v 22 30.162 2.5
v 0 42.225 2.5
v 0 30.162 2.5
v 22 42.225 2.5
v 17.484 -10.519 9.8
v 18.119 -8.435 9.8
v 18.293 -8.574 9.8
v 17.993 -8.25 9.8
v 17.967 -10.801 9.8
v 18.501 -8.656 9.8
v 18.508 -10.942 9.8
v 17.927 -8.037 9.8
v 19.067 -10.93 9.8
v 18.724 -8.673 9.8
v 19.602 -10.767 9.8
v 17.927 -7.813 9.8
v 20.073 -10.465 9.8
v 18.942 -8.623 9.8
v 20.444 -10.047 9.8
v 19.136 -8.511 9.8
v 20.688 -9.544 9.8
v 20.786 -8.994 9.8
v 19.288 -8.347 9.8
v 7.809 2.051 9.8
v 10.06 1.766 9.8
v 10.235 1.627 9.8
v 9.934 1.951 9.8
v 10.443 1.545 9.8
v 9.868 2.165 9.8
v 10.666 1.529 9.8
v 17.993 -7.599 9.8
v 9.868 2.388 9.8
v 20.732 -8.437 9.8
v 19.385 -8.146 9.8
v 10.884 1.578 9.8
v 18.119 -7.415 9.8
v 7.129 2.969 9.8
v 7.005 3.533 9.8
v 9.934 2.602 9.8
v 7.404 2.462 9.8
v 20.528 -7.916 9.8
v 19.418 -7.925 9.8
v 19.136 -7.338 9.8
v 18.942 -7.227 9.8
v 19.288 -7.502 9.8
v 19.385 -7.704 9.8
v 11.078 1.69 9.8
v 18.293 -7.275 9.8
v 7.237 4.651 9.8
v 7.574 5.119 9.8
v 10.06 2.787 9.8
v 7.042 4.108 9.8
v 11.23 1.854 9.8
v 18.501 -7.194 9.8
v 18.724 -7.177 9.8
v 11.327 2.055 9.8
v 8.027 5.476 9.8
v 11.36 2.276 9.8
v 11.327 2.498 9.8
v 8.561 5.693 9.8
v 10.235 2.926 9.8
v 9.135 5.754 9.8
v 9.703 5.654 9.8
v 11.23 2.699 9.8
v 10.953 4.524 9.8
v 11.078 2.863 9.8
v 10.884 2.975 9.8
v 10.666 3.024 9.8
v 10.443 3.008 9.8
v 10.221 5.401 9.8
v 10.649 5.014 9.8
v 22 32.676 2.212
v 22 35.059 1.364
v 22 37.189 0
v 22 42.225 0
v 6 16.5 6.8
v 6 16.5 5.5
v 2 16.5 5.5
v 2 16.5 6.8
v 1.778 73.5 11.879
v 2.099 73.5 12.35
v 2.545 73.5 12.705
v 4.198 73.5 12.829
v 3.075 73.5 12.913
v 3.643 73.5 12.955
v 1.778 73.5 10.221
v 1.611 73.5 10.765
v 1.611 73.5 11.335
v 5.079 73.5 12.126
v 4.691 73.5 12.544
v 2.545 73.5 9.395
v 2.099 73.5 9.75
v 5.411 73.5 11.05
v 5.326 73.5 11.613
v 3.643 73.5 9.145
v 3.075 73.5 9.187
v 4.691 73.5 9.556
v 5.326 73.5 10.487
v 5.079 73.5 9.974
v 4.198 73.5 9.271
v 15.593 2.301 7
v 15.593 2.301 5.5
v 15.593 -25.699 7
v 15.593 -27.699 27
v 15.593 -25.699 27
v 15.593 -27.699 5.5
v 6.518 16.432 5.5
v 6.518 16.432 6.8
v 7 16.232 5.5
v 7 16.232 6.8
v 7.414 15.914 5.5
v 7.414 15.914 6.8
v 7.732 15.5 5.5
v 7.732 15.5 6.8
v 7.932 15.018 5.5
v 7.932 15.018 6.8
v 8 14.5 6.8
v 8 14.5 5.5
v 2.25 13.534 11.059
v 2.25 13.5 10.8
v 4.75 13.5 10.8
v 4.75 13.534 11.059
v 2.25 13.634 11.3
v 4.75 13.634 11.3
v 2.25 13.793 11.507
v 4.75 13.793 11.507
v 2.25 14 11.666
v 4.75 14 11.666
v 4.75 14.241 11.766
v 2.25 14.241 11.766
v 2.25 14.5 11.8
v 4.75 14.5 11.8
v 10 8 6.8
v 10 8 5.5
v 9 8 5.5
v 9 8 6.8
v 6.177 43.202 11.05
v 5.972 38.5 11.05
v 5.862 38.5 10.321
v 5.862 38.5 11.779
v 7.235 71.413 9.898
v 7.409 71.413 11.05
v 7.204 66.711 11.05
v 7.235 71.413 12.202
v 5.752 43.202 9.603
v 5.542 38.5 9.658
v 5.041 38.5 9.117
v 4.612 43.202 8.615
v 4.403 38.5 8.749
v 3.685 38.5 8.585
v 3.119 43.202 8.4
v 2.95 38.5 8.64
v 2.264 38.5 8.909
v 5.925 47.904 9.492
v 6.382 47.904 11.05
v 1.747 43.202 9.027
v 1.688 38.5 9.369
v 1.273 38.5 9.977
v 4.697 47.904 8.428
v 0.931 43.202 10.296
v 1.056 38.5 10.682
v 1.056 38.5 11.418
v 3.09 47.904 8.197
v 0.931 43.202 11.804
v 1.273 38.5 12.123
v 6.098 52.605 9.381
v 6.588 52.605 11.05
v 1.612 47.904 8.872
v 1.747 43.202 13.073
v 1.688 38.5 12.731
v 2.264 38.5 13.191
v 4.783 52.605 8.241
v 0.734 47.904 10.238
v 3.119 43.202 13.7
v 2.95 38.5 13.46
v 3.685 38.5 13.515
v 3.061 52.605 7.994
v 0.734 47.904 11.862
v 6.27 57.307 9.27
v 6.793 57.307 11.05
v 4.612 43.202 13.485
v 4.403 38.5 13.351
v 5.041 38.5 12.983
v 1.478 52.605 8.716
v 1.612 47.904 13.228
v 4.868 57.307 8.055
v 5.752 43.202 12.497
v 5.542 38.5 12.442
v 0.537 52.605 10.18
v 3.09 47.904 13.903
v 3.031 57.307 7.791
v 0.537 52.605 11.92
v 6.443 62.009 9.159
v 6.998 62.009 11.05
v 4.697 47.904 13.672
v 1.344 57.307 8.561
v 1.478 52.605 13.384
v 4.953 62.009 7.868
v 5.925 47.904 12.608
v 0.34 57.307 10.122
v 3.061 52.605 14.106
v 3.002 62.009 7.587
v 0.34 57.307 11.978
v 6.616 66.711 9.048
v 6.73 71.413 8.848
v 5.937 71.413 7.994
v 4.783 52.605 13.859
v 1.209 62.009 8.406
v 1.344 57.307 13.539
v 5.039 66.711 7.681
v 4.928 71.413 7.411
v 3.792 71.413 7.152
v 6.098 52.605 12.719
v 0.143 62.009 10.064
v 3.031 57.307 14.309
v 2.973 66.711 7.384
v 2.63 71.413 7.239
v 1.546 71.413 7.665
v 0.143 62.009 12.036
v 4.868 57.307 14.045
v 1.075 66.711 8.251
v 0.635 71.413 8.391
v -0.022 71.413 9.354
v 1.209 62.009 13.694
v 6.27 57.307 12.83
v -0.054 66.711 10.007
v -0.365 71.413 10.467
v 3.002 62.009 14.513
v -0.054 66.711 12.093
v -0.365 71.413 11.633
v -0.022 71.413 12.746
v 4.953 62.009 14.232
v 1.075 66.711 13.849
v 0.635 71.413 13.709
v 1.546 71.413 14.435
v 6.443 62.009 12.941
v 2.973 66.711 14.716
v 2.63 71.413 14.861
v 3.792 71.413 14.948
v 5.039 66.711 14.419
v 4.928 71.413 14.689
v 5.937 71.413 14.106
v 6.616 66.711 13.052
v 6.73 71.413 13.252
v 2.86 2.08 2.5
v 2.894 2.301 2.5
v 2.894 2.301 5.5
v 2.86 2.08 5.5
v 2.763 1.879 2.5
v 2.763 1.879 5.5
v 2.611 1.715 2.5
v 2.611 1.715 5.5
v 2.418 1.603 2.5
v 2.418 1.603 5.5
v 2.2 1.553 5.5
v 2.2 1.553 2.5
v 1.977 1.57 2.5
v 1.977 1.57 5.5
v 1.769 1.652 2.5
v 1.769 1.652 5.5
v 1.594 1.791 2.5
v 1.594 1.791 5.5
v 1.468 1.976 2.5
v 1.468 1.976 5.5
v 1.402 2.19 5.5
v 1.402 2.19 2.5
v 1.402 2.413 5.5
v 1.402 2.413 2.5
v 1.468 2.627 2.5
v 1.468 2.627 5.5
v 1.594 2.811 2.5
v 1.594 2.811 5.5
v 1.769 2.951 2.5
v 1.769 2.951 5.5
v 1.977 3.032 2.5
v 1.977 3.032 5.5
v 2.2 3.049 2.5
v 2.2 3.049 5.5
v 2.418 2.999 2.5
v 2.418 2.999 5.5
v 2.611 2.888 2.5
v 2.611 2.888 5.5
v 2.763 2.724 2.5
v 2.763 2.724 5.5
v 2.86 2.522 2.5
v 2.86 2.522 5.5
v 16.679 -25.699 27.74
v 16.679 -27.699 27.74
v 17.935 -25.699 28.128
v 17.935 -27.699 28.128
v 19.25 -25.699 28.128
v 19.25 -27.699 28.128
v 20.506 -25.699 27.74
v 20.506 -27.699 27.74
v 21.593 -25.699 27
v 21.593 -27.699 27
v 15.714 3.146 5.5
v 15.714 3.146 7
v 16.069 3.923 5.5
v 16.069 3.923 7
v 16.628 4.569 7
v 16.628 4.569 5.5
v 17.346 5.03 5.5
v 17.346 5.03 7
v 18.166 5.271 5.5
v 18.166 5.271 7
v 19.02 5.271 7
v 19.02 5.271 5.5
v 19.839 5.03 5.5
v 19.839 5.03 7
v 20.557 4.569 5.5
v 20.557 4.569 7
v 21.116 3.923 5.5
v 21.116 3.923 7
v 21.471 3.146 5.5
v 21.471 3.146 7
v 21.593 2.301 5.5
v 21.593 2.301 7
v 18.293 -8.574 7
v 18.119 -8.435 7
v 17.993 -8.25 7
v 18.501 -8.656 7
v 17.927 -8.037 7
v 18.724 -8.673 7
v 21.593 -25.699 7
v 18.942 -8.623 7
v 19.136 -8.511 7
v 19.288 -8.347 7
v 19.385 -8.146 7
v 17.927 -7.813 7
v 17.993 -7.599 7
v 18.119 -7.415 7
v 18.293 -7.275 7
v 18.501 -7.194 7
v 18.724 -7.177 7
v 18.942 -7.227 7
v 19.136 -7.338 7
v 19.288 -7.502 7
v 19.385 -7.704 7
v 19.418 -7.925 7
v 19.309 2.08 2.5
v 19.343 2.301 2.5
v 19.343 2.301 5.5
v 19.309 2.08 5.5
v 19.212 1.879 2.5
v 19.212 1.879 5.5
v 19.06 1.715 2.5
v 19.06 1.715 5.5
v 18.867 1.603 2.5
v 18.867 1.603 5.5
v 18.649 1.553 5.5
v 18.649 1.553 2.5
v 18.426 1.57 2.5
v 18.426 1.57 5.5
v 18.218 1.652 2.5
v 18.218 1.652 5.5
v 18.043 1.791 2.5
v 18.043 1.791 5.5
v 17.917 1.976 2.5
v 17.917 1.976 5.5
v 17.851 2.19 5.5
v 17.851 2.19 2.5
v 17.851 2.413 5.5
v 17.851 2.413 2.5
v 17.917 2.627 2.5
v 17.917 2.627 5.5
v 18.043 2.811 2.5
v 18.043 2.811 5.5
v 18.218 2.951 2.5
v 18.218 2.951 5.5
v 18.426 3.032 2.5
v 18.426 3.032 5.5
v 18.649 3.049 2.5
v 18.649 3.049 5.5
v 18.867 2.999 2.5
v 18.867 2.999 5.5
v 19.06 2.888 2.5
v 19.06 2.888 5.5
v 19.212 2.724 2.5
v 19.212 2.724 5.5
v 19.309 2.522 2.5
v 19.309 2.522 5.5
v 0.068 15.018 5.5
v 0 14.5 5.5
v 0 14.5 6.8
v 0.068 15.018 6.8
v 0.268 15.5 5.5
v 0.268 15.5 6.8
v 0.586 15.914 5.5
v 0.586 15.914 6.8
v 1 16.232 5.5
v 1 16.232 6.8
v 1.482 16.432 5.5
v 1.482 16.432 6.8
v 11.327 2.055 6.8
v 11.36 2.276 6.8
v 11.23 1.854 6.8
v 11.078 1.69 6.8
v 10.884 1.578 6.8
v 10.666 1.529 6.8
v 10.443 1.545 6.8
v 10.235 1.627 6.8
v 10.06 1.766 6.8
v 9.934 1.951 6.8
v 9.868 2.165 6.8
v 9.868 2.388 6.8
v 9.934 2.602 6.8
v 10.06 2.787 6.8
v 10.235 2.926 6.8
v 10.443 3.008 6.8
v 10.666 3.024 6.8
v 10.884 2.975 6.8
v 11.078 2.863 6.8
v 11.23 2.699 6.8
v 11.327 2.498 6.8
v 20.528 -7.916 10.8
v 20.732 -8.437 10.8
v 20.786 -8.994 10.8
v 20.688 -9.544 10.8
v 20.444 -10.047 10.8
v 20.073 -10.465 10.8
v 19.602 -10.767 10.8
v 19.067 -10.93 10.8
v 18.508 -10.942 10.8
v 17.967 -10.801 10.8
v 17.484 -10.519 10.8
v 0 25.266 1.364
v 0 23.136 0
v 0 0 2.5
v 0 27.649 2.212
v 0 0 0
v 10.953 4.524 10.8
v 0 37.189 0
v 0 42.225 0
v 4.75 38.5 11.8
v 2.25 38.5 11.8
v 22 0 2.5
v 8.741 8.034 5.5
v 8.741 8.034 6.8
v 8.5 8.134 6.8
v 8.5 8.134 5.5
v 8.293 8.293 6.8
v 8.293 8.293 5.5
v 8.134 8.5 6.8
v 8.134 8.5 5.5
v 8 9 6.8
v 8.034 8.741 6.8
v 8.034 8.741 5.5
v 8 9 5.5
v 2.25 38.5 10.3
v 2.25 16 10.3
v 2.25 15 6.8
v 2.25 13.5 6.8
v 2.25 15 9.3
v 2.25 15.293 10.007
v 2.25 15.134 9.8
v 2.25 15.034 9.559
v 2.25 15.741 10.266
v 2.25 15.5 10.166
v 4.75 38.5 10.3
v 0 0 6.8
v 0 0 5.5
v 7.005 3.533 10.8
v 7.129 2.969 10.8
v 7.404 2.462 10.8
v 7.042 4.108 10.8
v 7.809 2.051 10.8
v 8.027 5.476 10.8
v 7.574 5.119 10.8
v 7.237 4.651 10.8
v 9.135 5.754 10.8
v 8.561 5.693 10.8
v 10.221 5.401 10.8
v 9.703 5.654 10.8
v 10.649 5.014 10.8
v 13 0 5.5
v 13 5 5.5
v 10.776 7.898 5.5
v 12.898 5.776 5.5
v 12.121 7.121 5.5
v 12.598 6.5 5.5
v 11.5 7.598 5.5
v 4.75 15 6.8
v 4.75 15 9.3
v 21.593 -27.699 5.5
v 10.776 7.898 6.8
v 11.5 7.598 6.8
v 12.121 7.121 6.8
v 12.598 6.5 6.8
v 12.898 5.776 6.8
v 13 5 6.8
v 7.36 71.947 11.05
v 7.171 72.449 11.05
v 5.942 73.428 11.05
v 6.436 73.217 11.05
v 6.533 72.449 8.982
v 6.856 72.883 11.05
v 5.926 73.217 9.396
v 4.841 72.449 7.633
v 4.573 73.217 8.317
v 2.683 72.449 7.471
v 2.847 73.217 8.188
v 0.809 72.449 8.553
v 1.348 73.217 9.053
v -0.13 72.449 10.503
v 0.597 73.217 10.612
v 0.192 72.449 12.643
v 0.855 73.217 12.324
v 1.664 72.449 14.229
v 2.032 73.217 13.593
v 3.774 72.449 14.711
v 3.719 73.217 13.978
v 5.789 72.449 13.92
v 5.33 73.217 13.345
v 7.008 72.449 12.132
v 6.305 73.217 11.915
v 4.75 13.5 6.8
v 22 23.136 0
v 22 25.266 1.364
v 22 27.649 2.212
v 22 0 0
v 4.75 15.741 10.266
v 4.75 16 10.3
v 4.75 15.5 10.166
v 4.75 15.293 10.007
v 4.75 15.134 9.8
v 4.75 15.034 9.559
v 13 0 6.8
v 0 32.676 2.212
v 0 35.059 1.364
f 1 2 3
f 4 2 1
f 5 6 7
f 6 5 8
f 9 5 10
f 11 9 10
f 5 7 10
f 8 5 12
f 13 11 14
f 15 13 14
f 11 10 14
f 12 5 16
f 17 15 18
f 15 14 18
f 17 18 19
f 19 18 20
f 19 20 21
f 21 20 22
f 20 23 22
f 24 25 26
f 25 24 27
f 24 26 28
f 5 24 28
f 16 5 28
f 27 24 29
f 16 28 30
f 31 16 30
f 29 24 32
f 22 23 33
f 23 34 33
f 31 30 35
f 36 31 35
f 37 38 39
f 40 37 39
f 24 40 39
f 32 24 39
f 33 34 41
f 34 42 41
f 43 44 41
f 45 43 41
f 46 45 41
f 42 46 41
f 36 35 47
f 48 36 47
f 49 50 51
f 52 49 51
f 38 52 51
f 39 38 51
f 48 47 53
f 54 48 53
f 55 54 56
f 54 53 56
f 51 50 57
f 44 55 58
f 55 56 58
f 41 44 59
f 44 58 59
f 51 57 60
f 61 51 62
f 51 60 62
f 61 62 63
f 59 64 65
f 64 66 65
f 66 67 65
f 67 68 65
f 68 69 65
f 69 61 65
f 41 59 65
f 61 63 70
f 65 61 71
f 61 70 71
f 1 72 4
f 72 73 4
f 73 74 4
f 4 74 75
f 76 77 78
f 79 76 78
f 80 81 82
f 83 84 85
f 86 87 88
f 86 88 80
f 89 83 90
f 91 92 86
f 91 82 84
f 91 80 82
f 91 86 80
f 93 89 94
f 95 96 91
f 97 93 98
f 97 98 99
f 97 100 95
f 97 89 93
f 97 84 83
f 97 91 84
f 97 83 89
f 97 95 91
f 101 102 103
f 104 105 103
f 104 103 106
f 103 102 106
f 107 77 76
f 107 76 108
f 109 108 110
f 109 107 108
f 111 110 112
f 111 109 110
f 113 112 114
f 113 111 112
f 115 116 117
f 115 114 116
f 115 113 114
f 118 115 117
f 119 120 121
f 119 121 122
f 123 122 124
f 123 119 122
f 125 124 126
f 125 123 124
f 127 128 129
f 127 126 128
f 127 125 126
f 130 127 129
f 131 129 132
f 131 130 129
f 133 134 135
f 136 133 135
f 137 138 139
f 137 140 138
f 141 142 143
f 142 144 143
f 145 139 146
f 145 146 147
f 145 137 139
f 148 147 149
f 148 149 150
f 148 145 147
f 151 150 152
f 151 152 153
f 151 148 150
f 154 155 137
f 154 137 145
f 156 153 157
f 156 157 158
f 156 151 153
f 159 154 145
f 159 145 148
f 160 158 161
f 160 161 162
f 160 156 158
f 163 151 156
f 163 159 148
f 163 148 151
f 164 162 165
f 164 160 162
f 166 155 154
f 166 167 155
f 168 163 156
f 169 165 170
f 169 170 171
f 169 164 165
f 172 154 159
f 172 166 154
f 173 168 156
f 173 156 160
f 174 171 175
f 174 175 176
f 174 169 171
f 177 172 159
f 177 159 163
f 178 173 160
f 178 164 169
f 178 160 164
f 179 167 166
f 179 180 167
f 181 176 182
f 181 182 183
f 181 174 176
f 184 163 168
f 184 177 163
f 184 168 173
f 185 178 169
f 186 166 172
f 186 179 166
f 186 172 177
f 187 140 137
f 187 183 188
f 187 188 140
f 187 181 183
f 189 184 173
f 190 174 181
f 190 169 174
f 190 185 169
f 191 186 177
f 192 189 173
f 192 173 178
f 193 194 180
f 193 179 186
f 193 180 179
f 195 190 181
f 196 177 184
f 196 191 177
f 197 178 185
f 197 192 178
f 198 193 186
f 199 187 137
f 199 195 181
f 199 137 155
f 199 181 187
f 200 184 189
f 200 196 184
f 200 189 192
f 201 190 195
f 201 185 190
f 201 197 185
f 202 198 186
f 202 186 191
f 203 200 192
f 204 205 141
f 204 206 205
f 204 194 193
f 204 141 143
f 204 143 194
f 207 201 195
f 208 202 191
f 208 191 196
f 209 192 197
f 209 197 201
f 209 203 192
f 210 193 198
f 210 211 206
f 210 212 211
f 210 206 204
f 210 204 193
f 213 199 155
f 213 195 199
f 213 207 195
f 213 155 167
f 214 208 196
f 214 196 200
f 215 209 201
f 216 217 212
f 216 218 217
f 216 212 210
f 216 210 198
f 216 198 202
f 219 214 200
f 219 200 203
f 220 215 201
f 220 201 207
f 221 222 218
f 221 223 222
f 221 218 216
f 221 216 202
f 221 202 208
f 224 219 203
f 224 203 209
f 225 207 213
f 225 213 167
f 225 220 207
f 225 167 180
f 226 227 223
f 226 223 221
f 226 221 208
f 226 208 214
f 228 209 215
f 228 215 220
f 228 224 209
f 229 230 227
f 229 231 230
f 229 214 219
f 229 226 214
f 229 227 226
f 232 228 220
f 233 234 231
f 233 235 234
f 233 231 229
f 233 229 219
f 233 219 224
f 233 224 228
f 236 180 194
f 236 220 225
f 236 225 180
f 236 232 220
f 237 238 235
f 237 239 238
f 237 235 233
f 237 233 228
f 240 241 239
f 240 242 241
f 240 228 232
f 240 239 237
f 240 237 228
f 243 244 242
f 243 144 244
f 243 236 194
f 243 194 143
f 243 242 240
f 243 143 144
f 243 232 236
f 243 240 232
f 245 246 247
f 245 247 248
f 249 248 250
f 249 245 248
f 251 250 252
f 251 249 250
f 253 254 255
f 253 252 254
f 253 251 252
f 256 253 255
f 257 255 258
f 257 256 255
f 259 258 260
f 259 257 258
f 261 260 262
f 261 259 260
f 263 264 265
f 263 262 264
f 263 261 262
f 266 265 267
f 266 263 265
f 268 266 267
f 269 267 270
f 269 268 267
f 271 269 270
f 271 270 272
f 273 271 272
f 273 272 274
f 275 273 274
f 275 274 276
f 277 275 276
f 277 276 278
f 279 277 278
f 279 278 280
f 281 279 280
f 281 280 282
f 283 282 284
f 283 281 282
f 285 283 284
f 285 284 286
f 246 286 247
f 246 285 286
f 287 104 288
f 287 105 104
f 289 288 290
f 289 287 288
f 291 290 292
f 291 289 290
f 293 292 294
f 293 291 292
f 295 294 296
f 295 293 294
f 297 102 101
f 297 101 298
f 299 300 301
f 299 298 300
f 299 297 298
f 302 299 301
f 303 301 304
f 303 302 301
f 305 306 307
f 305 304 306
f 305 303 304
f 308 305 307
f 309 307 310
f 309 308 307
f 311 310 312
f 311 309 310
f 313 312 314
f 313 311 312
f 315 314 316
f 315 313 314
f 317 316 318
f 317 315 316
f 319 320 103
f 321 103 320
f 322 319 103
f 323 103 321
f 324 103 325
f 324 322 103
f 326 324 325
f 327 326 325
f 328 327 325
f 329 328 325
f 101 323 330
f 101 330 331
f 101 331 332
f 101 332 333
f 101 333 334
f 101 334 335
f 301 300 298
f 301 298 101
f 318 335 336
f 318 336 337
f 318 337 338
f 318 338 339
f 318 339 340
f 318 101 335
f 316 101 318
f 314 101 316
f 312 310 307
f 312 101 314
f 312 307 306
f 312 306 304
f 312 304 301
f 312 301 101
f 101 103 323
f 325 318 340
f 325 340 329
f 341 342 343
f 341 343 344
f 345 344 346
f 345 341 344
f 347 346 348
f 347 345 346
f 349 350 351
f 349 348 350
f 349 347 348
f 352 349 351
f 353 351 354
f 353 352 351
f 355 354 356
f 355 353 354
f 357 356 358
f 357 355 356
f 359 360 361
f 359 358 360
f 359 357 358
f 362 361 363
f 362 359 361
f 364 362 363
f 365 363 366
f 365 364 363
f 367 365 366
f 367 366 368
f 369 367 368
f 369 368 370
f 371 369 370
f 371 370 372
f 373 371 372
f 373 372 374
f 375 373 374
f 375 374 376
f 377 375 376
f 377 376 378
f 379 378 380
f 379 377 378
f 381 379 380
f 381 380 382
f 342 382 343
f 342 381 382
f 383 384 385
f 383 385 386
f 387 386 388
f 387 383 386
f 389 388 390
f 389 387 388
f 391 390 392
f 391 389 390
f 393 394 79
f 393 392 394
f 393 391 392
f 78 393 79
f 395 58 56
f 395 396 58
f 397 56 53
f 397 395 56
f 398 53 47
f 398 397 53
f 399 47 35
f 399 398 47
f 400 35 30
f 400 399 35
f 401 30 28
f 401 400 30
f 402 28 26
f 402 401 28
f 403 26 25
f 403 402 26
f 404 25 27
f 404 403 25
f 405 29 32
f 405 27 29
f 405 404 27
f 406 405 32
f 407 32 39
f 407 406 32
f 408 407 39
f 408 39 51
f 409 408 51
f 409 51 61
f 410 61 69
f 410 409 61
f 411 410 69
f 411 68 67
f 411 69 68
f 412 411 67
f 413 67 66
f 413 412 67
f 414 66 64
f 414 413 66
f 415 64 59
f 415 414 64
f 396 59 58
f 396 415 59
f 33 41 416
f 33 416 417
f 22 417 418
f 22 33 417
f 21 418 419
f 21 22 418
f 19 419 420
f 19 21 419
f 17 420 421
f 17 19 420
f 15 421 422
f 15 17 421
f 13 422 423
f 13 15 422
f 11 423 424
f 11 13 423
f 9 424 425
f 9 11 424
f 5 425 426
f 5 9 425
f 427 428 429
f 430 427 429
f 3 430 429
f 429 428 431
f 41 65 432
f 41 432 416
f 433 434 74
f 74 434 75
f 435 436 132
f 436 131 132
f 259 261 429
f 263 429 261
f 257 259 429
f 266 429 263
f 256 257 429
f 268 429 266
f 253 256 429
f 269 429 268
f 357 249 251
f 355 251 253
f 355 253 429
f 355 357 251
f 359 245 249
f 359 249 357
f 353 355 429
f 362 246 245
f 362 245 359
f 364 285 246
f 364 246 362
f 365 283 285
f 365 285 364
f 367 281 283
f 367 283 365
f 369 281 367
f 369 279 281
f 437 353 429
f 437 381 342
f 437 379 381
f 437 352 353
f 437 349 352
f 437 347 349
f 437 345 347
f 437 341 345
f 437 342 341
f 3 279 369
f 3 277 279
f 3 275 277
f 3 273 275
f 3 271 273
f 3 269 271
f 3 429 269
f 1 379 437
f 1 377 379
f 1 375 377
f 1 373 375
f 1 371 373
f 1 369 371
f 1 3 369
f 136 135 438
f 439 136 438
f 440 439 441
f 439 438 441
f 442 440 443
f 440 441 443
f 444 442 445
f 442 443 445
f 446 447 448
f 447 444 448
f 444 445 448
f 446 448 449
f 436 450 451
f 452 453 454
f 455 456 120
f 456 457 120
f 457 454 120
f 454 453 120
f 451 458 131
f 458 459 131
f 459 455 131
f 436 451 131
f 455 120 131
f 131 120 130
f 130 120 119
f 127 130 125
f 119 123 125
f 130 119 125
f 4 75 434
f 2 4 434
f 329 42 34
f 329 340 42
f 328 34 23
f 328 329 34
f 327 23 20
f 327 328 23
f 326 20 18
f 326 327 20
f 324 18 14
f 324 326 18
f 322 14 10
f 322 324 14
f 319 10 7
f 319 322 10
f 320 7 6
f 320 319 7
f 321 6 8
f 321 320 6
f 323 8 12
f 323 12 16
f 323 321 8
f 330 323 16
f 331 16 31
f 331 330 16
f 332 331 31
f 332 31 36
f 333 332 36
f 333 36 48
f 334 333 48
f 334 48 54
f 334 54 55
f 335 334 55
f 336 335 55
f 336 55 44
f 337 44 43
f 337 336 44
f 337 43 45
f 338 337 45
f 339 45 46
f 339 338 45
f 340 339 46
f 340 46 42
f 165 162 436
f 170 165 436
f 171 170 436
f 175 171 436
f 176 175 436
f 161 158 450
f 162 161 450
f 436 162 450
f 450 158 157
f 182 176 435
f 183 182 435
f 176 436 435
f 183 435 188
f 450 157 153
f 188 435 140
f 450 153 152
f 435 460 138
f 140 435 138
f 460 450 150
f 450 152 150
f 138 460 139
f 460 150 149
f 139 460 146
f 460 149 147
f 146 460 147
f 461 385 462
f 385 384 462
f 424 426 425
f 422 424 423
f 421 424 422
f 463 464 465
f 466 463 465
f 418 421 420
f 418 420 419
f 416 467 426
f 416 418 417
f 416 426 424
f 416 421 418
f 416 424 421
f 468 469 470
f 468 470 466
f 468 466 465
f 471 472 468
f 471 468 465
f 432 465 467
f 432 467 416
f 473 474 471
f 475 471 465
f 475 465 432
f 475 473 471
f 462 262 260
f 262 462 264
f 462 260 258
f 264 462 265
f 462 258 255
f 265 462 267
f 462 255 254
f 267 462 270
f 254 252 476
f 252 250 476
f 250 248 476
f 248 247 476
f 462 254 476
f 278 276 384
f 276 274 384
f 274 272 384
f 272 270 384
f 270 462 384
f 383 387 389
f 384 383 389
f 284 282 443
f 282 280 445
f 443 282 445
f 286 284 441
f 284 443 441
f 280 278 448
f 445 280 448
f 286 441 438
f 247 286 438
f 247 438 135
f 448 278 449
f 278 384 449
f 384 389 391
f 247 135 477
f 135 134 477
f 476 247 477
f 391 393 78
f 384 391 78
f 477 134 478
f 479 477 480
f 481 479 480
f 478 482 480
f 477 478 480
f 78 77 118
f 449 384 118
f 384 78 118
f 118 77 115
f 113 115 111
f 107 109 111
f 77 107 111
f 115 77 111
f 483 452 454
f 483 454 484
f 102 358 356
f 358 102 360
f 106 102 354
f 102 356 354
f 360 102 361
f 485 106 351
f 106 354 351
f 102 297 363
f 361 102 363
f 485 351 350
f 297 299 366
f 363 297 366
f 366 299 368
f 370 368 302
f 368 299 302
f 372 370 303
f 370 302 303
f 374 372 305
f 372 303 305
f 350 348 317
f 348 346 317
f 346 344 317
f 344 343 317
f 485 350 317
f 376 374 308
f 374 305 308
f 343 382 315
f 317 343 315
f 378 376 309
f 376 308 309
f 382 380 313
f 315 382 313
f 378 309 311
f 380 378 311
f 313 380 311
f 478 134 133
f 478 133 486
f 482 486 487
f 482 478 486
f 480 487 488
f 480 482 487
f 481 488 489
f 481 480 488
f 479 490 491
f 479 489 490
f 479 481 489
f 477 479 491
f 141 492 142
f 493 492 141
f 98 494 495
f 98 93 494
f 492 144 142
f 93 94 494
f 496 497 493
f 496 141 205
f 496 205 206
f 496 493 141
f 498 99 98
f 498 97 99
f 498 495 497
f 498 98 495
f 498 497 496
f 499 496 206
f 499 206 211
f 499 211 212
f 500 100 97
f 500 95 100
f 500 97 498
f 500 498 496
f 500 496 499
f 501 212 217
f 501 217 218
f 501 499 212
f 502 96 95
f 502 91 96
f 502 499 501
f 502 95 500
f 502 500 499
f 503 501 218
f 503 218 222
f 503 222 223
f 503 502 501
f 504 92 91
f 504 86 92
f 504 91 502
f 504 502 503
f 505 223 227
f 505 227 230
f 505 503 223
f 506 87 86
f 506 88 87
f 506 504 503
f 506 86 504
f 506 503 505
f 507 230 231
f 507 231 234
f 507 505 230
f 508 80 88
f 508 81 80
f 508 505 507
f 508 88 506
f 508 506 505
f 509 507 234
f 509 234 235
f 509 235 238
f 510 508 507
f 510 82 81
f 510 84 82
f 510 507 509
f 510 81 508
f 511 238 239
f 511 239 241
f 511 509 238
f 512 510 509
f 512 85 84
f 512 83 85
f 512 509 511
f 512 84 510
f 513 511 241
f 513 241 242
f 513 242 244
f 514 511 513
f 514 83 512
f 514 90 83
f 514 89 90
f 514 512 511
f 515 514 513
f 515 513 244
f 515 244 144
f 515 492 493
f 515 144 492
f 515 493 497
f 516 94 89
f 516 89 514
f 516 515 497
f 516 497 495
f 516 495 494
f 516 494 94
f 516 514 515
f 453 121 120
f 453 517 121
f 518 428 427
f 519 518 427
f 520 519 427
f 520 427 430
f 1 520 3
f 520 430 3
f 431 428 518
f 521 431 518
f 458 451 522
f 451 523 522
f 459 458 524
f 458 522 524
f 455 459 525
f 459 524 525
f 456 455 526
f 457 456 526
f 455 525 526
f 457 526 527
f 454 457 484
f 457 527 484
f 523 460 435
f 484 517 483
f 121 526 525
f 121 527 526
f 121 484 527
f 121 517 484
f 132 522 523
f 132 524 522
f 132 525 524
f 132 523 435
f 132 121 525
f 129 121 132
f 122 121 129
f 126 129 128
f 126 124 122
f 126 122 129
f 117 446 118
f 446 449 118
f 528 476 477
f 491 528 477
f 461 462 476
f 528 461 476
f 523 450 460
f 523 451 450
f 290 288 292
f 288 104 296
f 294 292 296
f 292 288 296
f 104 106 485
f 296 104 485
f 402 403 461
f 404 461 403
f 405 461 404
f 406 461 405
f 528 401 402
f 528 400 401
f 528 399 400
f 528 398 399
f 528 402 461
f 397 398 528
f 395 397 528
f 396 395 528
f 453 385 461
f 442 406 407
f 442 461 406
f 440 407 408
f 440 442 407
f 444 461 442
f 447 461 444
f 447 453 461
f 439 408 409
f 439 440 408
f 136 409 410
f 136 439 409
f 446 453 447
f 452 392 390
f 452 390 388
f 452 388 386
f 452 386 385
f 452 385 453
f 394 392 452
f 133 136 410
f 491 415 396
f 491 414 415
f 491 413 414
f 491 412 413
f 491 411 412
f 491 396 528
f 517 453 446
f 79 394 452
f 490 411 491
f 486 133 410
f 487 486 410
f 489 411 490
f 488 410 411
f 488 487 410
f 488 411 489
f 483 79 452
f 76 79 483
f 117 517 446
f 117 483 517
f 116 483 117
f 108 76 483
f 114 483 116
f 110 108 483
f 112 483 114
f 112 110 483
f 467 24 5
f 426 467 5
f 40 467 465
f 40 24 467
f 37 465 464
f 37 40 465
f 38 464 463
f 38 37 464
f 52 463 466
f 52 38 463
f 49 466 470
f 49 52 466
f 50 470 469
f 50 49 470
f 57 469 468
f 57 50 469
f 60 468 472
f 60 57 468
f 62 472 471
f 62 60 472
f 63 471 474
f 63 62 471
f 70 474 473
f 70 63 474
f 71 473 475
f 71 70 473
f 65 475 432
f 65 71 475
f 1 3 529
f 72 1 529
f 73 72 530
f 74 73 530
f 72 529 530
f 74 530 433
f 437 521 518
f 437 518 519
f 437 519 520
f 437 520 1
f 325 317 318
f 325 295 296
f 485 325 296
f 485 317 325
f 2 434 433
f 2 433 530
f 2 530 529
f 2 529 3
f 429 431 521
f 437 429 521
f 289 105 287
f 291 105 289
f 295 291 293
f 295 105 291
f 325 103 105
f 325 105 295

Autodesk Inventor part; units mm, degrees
ref_plane "YZ Plane" through (0, 0, 0) normal (1, 0, 0) x (0, 1, 0)
ref_plane "XZ Plane" through (0, 0, 0) normal (0, 1, 0) x (-1, 0, 0)
ref_plane "XY Plane" through (0, 0, 0) normal (0, 0, 1) x (1, 0, 0)
sketch "Sketch1" plane through (0, 0, 0) normal (0, 0, 1) x (1, 0, 0)
  line L0 (0, 42.225) -> (0, 0)
  line L1 (0, 0) -> (22, 0)
  line L2 (22, 0) -> (22, 42.225)
  line L3 (22, 42.225) -> (0, 42.225)
  dimension "d0" = 22
  dimension "d1" = 42.225
extrude "Extrusion1" add sketch "Sketch1" along normal blind 2.5
sketch "Sketch2" plane through (0, 0, 0) normal (-1, 0, 0) x (0, 0, 1)
  line L0 (2.5, 0) -> (2.5, 42.225) projected
  arc A0 (0, 23.1358) -> (0, 37.1892) centre (-8.625, 30.1625) ccw
  line L1 (0, 0) -> (0, 42.225) projected
  line L2 (0, 23.1358) -> (0, 37.1892)
  dimension "d62" = 22.25
  dimension "d63" = 0
extrude "Extrusion2" cut sketch "Sketch2" against normal through all
sketch "Sketch3" plane through (0, 0, 2.5) normal (0, 0, 1) x (1, 0, 0)
  circle A0 centre (2.1436, 2.3013) radius 0.75
  point P0 (0, 0)
  dimension "d7" = 1.5
extrude "Extrusion3" add sketch "Sketch3" along normal blind 3
sketch "Sketch4" plane through (2.1436, 2.3013, 5.5) normal (0, 0, 1) x (1, 0, 0)
  line L0 (-2.1436, -2.3013) -> (19.8564, -2.3013) projected
  line L1 (-2.1436, -2.3013) -> (10.8564, -2.3013)
  line L2 (10.8564, -2.3013) -> (10.8564, 2.6987)
  line L3 (7.8564, 5.6987) -> (6.8564, 5.6987)
  line L4 (5.8564, 6.6987) -> (5.8564, 12.1987)
  line L5 (3.8564, 14.1987) -> (-0.1436, 14.1987)
  line L6 (-2.1436, 39.9237) -> (-2.1436, -2.3013) projected
  line L7 (-2.1436, -2.3013) -> (-2.1436, 12.1987)
  arc A0 (-0.1436, 14.1987) -> (-2.1436, 12.1987) centre (-0.1436, 12.1987) ccw
  arc A1 (5.8564, 12.1987) -> (3.8564, 14.1987) centre (3.8564, 12.1987) ccw
  arc A2 (5.8564, 6.6987) -> (6.8564, 5.6987) centre (6.8564, 6.6987) ccw
  arc A3 (10.8564, 2.6987) -> (7.8564, 5.6987) centre (7.8564, 2.6987) ccw
  point P0 (-2.1436, 14.1987)
  point P1 (-2.1436, 17.6987)
  point P2 (8.8564, -2.3013)
  dimension "d10" = 8
  dimension "d11" = 8
  dimension "d12" = 16.5
  dimension "d13" = 13
  dimension "d14" = 2
  dimension "d15" = 2
  dimension "d16" = 1
  dimension "d17" = 3
extrude "Extrusion4" add sketch "Sketch4" along normal blind 1.3
sketch "Sketch5" plane through (2.1436, 2.3013, 6.8) normal (0, 0, 1) x (1, 0, 0)
  point P0 (-2.1436, -2.3013)
sketch "Sketch6" plane through (0, 0, 2.5) normal (0, 0, 1) x (1, 0, 0)
  circle A0 centre (18.5926, 2.3013) radius 0.75
  point P0 (0, 0)
  dimension "d20" = 1.5
extrude "Extrusion5" add sketch "Sketch6" along normal blind 3
sketch "Sketch7" plane through (18.5926, 2.3013, 5.5) normal (0, 0, 1) x (1, 0, 0)
  circle A0 centre (0, 0) radius 0.75 projected
  line L0 (0, 0) -> (6, 0)
  line L1 (0, 0) -> (3, 0)
  line L2 (3, 0) -> (3, -30)
  line L3 (3, -30) -> (0, -30)
  line L4 (0, -0.75) -> (0, 0)
  line L5 (0, 0) -> (-3, 0)
  line L6 (-3, 0) -> (-3, -30)
  line L7 (-3, -30) -> (0, -30)
  line L8 (0, -0.75) -> (0, 0)
  arc A1 (3, 0) -> (-3, 0) centre (0, 0) ccw
  point P0 (-18.5926, -2.3013)
  point P1 (-1.5, -30)
  point P2 (0, -30)
  dimension "d23" = 3
  dimension "d24" = 3
  dimension "d25" = 30
extrude "Extrusion6" add sketch "Sketch7" along normal blind 1.5
sketch "Sketch8" plane through (2.1436, 2.3013, 6.8) normal (0, 0, 1) x (1, 0, 0)
  circle A0 centre (8.4665, -0.0248) radius 0.75
  point P0 (-2.1436, -2.3013)
  dimension "d28" = 1.5
extrude "Extrusion7" add sketch "Sketch8" along normal blind 3
sketch "Sketch9" plane through (2.1436, 2.3013, 6.8) normal (0, 0, 1) x (1, 0, 0)
  line L0 (0.1064, 12.6987) -> (2.6064, 12.6987)
  line L1 (2.6064, 12.6987) -> (2.6064, 11.1987)
  line L2 (2.6064, 11.1987) -> (0.1064, 11.1987)
  line L3 (0.1064, 11.1987) -> (0.1064, 12.6987)
  line L4 (3.8564, 14.1987) -> (-0.1436, 14.1987) projected
  line L5 (-2.1436, 12.1987) -> (-2.1436, -2.3013) projected
  dimension "d31" = 2.5
  dimension "d32" = 1.5
  dimension "d33" = 1.5
  dimension "d34" = 2.25
extrude "Extrusion8" add sketch "Sketch9" along normal blind 5
sketch "Sketch10" plane through (2.25, 13.5, 6.8) normal (-1, 0, 0) x (0, 0, 1)
  point P0 (-6.8, -13.5)
sketch "Sketch11" plane through (2.25, 15, 6.8) normal (0, 1, 0) x (1, 0, 0)
  line L0 (0, -5) -> (2.5, -5) projected
  line L1 (0, 0) -> (0, -5) projected
  line L2 (2.5, -5) -> (0, -5)
  line L3 (0, -5) -> (0, -3.5)
  line L4 (0, -3.5) -> (2.5, -3.5)
  line L5 (2.5, -3.5) -> (2.5, -5)
  point P0 (-2.25, 6.8)
  dimension "d37" = 1.5
extrude "Extrusion9" add sketch "Sketch11" along normal blind 23.5
fillet "Fillet1" radius 1 1 edges at (3.5, 13.5, 11.8)
fillet "Fillet2" radius 1 1 edges at (3.5, 15, 10.3)
sketch "Sketch12" plane through (2.25, 38.5, 6.8) normal (0, 1, 0) x (1, 0, 0)
  line L0 (2.5, -5) -> (0, -5) projected
  line L1 (1.25, -5) -> (1.25, -4.25)
  circle A0 centre (1.25, -4.25) radius 4
  point P0 (-2.25, 6.8)
  dimension "d42" = 0.75
  dimension "d43" = 8
extrude "Extrusion10" add sketch "Sketch12" along normal blind 35
draft "FaceDraft1" angle 2.5 pull direction (0, -1, 0) faces at (7.487, 61.8333, 11.3719) fixed edges at (-0.5, 73.5, 11.05)
fillet "Fillet3" radius 2 1 edges at (-0.5, 73.5, 11.05)
sketch "Sketch13" plane through (18.5926, 2.3013, 7) normal (0, 0, 1) x (1, 0, 0)
  circle A0 centre (-7.9825, -0.0248) radius 0.75 projected
  circle A1 centre (0.0757, -10.2261) radius 0.75
  line L0 (-7.9825, -0.0248) -> (-7.5176, -0.6133)
  line L1 (-0.3892, -9.6376) -> (0.0757, -10.2261)
  point P0 (-18.5926, -2.3013)
  dimension "d49" = 1.5
  dimension "d48" = 13
extrude "Extrusion11" add sketch "Sketch13" along normal blind 3 contours A1
sketch "Sketch14" plane through (10.6101, 2.2765, 9.8) normal (0, 0, 1) x (1, 0, 0)
  line L0 (-2.8011, -0.2255) -> (6.8738, -12.7955)
  line L1 (10.9825, -29.9752) -> (10.9825, 0.0248) projected
  line L2 (0.3433, 2.2472) -> (9.9183, -10.1929)
  arc A0 (0.3433, 2.2472) -> (-2.8011, -0.2255) centre (-1.5459, 1.414) ccw
  arc A1 (6.8738, -12.7955) -> (9.9183, -10.1929) centre (8.1356, -11.1896) ccw
  point P0 (-10.6101, -2.2765)
  dimension "d52" = 4
extrude "Extrusion12" add sketch "Sketch14" along normal blind 1
sketch "Sketch15" plane through (18.5926, 2.3013, 7) normal (0, 0, 1) x (1, 0, 0)
  line L0 (-3, 0) -> (-3, -30) projected
  line L1 (-3, -28) -> (3, -28)
  line L2 (3, -28) -> (3, -30)
  line L3 (3, -30) -> (-3, -30)
  line L4 (-3, -30) -> (-3, -28)
  point P0 (-18.5926, -2.3013)
  dimension "d56" = 2
extrude "Extrusion13" add sketch "Sketch15" along normal blind 20
sketch "Sketch16" plane through (15.5926, -25.6987, 7) normal (0, 1, 0) x (1, 0, 0)
  line L0 (0, -20) -> (6, -20) projected
  arc A0 (0, -20) -> (6, -20) centre (3, -16.7649) ccw
  point P0 (-15.5926, 7)
  dimension "d59" = 4.412
extrude "Extrusion14" add sketch "Sketch16" against normal blind 2
properties part number "G26 P999999"
